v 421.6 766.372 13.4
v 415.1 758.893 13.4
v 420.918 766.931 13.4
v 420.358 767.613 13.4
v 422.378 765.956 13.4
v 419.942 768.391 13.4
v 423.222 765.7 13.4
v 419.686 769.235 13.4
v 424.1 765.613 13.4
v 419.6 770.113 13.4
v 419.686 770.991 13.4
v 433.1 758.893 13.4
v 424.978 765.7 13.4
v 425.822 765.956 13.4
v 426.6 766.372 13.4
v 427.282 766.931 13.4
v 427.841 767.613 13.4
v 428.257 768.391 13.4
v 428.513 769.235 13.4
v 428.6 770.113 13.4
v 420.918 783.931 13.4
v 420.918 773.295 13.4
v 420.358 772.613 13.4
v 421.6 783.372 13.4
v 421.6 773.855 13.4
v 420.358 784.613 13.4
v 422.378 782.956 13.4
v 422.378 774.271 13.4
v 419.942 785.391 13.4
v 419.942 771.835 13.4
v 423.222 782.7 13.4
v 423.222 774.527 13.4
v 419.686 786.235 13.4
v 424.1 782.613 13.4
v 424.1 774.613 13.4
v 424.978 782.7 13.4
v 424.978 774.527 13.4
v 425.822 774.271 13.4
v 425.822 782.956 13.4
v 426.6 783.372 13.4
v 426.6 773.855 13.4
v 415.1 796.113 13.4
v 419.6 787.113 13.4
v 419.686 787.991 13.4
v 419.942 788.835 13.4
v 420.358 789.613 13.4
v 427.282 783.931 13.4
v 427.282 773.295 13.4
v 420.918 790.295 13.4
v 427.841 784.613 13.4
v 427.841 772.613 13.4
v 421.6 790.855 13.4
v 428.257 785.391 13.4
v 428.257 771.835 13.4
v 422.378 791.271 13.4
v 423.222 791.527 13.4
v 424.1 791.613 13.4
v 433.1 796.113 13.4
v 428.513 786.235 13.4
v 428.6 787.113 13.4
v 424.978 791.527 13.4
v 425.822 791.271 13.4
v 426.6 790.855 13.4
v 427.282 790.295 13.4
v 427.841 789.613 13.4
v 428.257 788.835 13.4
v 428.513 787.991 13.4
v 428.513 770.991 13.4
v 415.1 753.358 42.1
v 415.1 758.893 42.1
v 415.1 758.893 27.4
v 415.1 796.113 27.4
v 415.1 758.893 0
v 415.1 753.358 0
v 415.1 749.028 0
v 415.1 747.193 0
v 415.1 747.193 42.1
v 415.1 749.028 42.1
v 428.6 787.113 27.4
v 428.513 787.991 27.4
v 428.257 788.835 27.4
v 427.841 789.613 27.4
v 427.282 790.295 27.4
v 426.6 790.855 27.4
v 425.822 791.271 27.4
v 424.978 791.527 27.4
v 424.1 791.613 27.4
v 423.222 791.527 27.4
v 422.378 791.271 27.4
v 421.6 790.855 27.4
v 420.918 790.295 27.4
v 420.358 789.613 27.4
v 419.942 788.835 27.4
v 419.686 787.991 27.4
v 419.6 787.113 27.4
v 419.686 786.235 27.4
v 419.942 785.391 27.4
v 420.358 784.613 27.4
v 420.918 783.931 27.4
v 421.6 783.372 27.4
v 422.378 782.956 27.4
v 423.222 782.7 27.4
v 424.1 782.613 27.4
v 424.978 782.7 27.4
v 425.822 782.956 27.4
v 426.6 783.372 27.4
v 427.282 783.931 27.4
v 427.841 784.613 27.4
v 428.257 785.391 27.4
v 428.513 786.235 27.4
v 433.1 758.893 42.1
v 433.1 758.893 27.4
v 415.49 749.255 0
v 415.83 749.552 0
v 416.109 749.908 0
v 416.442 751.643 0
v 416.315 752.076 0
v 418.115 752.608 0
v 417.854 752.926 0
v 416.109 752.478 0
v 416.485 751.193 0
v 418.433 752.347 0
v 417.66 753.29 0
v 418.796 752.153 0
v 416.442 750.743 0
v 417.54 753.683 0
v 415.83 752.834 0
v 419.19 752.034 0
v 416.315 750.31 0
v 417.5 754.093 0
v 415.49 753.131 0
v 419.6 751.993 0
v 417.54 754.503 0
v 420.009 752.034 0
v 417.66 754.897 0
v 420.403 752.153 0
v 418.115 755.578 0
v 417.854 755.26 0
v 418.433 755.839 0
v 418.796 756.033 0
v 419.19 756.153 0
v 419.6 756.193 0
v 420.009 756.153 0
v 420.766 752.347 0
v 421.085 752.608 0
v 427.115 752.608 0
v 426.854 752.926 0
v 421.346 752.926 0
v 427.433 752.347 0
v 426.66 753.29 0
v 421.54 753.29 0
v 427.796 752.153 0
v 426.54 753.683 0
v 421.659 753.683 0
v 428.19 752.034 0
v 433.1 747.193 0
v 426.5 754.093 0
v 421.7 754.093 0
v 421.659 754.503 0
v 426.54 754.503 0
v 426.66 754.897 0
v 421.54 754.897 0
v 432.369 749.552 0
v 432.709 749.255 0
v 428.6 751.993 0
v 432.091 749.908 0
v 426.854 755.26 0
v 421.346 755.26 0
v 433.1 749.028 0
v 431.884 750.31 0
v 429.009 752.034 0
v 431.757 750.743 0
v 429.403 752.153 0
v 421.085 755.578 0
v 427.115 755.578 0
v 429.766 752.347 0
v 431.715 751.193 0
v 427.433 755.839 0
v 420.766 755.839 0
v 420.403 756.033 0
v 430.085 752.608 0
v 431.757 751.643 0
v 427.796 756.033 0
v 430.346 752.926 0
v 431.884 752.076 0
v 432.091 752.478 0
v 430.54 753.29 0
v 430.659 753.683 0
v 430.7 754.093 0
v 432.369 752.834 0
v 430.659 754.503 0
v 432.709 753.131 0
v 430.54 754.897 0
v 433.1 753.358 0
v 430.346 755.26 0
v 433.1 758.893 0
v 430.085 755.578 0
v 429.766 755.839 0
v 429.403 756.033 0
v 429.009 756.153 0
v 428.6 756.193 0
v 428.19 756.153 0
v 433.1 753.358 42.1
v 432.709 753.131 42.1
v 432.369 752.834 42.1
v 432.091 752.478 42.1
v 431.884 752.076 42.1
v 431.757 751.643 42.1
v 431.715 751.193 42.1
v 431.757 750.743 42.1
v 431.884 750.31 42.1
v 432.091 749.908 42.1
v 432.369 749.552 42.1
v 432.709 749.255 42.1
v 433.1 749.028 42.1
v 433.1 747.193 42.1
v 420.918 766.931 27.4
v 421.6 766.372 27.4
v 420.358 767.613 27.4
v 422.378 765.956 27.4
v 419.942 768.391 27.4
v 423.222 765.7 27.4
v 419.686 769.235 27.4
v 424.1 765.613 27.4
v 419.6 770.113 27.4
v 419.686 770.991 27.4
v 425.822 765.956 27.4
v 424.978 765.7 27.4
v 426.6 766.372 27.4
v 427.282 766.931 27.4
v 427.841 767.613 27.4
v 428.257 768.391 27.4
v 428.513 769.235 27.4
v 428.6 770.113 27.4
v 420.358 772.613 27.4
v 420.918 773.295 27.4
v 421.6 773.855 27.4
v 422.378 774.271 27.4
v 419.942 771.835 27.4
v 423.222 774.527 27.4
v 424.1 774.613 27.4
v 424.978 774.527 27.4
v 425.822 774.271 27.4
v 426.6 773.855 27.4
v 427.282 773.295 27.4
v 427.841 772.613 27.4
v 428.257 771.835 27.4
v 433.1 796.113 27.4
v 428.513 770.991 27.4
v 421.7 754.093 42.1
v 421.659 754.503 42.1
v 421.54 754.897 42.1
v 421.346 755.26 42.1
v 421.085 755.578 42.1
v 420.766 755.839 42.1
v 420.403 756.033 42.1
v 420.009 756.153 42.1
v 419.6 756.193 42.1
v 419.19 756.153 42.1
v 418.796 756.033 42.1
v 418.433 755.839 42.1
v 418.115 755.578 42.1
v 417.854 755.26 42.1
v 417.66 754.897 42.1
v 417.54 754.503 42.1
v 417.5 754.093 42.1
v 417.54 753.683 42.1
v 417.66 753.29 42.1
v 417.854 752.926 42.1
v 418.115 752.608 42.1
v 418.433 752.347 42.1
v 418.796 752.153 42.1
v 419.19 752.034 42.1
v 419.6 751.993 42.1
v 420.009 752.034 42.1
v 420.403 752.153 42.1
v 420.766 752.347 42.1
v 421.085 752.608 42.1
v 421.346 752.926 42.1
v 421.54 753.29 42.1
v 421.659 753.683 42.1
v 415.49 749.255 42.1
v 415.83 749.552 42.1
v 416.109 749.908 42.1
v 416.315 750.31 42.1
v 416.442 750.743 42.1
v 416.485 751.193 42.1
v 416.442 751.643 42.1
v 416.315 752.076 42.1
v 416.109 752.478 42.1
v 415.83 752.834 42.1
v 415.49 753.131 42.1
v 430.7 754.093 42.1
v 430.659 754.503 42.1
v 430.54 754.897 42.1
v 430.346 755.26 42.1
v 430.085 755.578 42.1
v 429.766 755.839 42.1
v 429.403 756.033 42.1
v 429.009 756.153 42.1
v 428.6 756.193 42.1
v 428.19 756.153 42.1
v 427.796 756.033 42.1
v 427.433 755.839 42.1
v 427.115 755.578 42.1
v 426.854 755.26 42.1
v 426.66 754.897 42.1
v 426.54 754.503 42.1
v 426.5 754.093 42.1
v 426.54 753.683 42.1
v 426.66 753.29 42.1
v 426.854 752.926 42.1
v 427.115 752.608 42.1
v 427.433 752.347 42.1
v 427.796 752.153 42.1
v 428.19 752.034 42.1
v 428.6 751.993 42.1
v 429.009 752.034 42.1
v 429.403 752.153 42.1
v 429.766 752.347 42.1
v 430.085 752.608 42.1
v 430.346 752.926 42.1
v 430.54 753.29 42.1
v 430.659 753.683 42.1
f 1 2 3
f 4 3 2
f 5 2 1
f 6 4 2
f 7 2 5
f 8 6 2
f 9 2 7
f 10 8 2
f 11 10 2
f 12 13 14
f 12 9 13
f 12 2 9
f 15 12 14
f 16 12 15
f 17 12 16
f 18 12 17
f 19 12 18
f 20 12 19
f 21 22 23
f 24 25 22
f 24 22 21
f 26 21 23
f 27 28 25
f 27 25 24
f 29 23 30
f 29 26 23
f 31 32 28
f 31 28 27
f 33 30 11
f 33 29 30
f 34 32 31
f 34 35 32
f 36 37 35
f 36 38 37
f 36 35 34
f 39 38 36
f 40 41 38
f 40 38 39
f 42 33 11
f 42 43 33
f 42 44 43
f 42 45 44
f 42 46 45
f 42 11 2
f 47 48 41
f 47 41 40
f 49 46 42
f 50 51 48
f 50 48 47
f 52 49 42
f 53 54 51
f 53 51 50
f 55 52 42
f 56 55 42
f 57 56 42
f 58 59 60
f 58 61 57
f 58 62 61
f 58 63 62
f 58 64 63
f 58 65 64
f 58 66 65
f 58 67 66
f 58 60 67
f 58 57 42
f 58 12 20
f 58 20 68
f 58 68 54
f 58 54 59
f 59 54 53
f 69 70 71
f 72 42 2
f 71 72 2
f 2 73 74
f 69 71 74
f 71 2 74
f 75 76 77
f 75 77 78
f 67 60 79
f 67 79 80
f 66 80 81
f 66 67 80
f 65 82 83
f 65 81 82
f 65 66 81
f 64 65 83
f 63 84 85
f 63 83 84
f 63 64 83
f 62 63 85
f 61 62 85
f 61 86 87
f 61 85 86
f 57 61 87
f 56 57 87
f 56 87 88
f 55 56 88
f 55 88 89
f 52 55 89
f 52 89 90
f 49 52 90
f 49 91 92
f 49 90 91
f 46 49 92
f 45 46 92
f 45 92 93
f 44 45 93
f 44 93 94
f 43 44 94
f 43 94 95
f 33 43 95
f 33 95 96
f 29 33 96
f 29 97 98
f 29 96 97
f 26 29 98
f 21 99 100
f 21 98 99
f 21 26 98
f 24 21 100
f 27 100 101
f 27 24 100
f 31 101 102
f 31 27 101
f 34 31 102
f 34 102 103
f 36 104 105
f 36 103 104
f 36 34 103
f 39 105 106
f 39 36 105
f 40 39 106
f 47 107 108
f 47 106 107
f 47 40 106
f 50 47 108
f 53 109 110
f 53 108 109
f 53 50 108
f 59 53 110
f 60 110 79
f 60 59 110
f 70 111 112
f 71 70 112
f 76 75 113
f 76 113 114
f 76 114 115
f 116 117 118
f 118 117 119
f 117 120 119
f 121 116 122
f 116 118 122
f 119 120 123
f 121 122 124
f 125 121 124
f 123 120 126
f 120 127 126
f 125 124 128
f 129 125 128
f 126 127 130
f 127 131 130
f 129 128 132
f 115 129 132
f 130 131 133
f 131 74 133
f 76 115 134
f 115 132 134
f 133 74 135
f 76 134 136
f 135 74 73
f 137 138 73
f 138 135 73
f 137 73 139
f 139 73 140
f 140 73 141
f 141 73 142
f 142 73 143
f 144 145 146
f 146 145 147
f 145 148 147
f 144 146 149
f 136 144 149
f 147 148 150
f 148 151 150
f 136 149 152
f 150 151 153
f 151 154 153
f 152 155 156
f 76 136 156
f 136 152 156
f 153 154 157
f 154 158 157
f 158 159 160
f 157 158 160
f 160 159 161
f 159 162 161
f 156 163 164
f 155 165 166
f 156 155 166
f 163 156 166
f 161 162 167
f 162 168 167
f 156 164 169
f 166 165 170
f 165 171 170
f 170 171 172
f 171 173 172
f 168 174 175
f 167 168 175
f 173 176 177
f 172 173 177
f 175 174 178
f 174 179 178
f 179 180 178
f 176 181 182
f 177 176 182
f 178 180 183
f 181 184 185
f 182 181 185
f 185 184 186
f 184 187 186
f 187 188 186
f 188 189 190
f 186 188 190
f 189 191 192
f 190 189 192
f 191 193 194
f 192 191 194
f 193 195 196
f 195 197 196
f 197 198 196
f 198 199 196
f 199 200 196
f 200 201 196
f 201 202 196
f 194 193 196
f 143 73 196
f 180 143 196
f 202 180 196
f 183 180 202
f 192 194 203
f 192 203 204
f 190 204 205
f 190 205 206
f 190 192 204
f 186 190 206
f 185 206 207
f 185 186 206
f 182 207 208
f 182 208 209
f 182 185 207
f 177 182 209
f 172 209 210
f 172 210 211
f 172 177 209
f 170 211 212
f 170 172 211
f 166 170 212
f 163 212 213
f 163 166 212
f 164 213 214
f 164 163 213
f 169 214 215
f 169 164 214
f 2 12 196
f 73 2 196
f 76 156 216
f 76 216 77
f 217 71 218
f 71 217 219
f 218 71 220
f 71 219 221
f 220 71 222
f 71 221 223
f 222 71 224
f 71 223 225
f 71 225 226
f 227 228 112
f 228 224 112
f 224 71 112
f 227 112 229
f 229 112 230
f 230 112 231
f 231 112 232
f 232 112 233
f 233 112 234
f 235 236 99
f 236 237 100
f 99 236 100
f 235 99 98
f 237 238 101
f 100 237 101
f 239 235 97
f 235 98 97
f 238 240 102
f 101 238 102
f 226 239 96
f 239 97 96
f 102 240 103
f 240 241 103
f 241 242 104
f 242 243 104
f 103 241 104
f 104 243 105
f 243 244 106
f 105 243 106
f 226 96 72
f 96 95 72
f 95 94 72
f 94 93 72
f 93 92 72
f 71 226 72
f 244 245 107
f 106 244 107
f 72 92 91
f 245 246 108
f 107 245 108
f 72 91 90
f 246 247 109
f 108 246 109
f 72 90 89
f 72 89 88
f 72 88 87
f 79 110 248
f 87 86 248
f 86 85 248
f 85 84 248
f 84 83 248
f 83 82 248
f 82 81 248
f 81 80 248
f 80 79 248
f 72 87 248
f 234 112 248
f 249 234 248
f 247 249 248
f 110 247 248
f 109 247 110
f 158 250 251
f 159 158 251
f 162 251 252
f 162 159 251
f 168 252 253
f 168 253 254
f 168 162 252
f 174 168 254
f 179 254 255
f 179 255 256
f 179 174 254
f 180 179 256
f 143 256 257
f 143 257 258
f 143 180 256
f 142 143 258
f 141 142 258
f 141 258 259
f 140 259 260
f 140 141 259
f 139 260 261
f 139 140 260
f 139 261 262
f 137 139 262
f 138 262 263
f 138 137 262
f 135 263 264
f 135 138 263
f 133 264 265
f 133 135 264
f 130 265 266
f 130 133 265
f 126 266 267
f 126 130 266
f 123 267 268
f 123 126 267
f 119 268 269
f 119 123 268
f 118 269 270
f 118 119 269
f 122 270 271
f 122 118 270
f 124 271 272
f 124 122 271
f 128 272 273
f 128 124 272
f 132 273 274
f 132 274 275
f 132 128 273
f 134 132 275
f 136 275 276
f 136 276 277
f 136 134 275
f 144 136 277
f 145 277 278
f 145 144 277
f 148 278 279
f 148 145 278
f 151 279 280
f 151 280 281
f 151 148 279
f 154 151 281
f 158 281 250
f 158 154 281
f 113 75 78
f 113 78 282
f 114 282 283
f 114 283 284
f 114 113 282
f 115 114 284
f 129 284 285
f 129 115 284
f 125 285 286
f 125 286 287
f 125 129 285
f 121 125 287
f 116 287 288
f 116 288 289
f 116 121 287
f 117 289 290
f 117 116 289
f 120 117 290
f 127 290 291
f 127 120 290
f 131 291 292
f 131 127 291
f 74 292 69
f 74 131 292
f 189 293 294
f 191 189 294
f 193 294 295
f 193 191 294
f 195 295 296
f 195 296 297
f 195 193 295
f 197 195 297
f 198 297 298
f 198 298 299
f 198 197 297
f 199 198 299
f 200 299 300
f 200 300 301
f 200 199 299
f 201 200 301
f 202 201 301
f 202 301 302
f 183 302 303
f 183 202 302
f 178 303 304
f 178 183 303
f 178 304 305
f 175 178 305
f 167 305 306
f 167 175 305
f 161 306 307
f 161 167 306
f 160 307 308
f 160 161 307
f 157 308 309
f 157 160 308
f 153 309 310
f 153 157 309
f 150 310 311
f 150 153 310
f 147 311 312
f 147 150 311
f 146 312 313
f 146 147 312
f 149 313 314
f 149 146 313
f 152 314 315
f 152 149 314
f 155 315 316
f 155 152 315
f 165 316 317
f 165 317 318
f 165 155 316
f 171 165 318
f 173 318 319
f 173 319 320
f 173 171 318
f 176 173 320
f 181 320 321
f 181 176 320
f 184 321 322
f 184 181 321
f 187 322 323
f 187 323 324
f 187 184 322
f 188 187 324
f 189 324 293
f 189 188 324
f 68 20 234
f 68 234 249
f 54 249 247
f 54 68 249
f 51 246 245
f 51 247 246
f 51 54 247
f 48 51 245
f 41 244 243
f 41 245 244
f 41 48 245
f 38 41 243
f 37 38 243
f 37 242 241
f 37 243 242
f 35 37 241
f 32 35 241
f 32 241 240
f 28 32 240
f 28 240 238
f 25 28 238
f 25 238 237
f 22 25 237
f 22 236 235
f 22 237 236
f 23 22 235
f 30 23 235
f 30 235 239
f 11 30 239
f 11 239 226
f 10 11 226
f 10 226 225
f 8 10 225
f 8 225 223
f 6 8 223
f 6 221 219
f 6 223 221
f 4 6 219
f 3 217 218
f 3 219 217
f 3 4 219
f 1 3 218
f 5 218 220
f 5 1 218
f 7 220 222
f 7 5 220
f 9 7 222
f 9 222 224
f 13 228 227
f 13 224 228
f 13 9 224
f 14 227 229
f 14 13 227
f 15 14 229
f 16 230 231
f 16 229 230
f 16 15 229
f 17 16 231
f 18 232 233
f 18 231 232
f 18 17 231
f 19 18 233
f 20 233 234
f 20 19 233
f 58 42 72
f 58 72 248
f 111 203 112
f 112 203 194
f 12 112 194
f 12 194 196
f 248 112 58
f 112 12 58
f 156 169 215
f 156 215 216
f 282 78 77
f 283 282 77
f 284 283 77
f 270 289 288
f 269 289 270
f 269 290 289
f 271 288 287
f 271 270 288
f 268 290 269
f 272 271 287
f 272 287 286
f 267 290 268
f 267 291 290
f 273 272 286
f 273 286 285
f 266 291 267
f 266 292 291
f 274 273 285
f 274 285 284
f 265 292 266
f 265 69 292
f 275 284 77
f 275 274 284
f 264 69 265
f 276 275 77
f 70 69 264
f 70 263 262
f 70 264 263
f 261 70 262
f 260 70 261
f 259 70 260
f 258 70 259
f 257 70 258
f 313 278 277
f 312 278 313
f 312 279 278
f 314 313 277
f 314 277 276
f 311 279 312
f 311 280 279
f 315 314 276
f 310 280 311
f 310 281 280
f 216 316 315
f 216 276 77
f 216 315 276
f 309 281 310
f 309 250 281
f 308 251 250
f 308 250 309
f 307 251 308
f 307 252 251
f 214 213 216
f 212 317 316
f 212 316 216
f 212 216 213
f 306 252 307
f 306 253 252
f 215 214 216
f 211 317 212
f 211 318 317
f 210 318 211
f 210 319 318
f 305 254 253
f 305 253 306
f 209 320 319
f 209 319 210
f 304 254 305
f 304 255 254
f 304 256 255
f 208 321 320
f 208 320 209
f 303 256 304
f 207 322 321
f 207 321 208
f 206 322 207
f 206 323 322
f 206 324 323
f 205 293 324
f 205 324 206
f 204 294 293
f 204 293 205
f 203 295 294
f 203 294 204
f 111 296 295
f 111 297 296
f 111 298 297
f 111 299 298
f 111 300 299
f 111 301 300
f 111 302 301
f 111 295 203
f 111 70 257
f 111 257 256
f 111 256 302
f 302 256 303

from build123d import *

# Parameters (mm, degrees)
SKETCH_6_W          = 18
SKETCH_6_H          = 37.22
SKETCH_6_R          = 4.5
SKETCH_6_R_2        = 2.1
EXTRUDE_2_DEPTH     = 42.1
SKETCH_8_W          = 14.7
SKETCH_8_H          = 37.22
SKETCH_8_W_2        = 13.4
CUT_EXTRUDE_1_DEPTH = 42.1


with BuildPart() as part:
    # 草图6 → 凸台-拉伸2 (new body)
    with BuildSketch(Plane.XY):
        with Locations((424.099665512, 777.503186937)):
            Rectangle(SKETCH_6_W, SKETCH_6_H)
        with Locations((424.099665512, 770.113186937)):
            Circle(SKETCH_6_R, mode=Mode.SUBTRACT)
        with Locations((424.099665512, 787.113186937)):
            Circle(SKETCH_6_R, mode=Mode.SUBTRACT)
        with BuildLine():
            ThreePointArc((433.099665512, 753.358417872), (431.714665512, 751.193186937), (433.099665512, 749.027956002))
            Line((433.099665512, 749.027956002), (433.099665512, 747.193186937))
            Line((433.099665512, 747.193186937), (415.099665512, 747.193186937))
            Line((415.099665512, 747.193186937), (415.099665512, 749.027956002))
            ThreePointArc((415.099665512, 749.027956002), (416.484665512, 751.193186937), (415.099665512, 753.358417872))
            Line((415.099665512, 753.358417872), (415.099665512, 758.893186937))
            Line((415.099665512, 758.893186937), (433.099665512, 758.893186937))
            Line((433.099665512, 758.893186937), (433.099665512, 753.358417872))
        make_face()
        with Locations((428.599665512, 754.093186937)):
            Circle(SKETCH_6_R_2, mode=Mode.SUBTRACT)
        with Locations((419.599665512, 754.093186937)):
            Circle(SKETCH_6_R_2, mode=Mode.SUBTRACT)
    extrude(amount=EXTRUDE_2_DEPTH)

    # 草图8 → 切除-拉伸1 (cut)
    with BuildSketch(Plane(origin=(433.099665512, 0, 0), x_dir=(0, 0, -1), z_dir=(1, 0, 0))):
        with Locations((-34.75, 777.503186937)):
            Rectangle(SKETCH_8_W, SKETCH_8_H)
        with Locations((-6.7, 777.503186937)):
            Rectangle(SKETCH_8_W_2, SKETCH_8_H)
    extrude(amount=-CUT_EXTRUDE_1_DEPTH, mode=Mode.SUBTRACT)


solid = part.part
